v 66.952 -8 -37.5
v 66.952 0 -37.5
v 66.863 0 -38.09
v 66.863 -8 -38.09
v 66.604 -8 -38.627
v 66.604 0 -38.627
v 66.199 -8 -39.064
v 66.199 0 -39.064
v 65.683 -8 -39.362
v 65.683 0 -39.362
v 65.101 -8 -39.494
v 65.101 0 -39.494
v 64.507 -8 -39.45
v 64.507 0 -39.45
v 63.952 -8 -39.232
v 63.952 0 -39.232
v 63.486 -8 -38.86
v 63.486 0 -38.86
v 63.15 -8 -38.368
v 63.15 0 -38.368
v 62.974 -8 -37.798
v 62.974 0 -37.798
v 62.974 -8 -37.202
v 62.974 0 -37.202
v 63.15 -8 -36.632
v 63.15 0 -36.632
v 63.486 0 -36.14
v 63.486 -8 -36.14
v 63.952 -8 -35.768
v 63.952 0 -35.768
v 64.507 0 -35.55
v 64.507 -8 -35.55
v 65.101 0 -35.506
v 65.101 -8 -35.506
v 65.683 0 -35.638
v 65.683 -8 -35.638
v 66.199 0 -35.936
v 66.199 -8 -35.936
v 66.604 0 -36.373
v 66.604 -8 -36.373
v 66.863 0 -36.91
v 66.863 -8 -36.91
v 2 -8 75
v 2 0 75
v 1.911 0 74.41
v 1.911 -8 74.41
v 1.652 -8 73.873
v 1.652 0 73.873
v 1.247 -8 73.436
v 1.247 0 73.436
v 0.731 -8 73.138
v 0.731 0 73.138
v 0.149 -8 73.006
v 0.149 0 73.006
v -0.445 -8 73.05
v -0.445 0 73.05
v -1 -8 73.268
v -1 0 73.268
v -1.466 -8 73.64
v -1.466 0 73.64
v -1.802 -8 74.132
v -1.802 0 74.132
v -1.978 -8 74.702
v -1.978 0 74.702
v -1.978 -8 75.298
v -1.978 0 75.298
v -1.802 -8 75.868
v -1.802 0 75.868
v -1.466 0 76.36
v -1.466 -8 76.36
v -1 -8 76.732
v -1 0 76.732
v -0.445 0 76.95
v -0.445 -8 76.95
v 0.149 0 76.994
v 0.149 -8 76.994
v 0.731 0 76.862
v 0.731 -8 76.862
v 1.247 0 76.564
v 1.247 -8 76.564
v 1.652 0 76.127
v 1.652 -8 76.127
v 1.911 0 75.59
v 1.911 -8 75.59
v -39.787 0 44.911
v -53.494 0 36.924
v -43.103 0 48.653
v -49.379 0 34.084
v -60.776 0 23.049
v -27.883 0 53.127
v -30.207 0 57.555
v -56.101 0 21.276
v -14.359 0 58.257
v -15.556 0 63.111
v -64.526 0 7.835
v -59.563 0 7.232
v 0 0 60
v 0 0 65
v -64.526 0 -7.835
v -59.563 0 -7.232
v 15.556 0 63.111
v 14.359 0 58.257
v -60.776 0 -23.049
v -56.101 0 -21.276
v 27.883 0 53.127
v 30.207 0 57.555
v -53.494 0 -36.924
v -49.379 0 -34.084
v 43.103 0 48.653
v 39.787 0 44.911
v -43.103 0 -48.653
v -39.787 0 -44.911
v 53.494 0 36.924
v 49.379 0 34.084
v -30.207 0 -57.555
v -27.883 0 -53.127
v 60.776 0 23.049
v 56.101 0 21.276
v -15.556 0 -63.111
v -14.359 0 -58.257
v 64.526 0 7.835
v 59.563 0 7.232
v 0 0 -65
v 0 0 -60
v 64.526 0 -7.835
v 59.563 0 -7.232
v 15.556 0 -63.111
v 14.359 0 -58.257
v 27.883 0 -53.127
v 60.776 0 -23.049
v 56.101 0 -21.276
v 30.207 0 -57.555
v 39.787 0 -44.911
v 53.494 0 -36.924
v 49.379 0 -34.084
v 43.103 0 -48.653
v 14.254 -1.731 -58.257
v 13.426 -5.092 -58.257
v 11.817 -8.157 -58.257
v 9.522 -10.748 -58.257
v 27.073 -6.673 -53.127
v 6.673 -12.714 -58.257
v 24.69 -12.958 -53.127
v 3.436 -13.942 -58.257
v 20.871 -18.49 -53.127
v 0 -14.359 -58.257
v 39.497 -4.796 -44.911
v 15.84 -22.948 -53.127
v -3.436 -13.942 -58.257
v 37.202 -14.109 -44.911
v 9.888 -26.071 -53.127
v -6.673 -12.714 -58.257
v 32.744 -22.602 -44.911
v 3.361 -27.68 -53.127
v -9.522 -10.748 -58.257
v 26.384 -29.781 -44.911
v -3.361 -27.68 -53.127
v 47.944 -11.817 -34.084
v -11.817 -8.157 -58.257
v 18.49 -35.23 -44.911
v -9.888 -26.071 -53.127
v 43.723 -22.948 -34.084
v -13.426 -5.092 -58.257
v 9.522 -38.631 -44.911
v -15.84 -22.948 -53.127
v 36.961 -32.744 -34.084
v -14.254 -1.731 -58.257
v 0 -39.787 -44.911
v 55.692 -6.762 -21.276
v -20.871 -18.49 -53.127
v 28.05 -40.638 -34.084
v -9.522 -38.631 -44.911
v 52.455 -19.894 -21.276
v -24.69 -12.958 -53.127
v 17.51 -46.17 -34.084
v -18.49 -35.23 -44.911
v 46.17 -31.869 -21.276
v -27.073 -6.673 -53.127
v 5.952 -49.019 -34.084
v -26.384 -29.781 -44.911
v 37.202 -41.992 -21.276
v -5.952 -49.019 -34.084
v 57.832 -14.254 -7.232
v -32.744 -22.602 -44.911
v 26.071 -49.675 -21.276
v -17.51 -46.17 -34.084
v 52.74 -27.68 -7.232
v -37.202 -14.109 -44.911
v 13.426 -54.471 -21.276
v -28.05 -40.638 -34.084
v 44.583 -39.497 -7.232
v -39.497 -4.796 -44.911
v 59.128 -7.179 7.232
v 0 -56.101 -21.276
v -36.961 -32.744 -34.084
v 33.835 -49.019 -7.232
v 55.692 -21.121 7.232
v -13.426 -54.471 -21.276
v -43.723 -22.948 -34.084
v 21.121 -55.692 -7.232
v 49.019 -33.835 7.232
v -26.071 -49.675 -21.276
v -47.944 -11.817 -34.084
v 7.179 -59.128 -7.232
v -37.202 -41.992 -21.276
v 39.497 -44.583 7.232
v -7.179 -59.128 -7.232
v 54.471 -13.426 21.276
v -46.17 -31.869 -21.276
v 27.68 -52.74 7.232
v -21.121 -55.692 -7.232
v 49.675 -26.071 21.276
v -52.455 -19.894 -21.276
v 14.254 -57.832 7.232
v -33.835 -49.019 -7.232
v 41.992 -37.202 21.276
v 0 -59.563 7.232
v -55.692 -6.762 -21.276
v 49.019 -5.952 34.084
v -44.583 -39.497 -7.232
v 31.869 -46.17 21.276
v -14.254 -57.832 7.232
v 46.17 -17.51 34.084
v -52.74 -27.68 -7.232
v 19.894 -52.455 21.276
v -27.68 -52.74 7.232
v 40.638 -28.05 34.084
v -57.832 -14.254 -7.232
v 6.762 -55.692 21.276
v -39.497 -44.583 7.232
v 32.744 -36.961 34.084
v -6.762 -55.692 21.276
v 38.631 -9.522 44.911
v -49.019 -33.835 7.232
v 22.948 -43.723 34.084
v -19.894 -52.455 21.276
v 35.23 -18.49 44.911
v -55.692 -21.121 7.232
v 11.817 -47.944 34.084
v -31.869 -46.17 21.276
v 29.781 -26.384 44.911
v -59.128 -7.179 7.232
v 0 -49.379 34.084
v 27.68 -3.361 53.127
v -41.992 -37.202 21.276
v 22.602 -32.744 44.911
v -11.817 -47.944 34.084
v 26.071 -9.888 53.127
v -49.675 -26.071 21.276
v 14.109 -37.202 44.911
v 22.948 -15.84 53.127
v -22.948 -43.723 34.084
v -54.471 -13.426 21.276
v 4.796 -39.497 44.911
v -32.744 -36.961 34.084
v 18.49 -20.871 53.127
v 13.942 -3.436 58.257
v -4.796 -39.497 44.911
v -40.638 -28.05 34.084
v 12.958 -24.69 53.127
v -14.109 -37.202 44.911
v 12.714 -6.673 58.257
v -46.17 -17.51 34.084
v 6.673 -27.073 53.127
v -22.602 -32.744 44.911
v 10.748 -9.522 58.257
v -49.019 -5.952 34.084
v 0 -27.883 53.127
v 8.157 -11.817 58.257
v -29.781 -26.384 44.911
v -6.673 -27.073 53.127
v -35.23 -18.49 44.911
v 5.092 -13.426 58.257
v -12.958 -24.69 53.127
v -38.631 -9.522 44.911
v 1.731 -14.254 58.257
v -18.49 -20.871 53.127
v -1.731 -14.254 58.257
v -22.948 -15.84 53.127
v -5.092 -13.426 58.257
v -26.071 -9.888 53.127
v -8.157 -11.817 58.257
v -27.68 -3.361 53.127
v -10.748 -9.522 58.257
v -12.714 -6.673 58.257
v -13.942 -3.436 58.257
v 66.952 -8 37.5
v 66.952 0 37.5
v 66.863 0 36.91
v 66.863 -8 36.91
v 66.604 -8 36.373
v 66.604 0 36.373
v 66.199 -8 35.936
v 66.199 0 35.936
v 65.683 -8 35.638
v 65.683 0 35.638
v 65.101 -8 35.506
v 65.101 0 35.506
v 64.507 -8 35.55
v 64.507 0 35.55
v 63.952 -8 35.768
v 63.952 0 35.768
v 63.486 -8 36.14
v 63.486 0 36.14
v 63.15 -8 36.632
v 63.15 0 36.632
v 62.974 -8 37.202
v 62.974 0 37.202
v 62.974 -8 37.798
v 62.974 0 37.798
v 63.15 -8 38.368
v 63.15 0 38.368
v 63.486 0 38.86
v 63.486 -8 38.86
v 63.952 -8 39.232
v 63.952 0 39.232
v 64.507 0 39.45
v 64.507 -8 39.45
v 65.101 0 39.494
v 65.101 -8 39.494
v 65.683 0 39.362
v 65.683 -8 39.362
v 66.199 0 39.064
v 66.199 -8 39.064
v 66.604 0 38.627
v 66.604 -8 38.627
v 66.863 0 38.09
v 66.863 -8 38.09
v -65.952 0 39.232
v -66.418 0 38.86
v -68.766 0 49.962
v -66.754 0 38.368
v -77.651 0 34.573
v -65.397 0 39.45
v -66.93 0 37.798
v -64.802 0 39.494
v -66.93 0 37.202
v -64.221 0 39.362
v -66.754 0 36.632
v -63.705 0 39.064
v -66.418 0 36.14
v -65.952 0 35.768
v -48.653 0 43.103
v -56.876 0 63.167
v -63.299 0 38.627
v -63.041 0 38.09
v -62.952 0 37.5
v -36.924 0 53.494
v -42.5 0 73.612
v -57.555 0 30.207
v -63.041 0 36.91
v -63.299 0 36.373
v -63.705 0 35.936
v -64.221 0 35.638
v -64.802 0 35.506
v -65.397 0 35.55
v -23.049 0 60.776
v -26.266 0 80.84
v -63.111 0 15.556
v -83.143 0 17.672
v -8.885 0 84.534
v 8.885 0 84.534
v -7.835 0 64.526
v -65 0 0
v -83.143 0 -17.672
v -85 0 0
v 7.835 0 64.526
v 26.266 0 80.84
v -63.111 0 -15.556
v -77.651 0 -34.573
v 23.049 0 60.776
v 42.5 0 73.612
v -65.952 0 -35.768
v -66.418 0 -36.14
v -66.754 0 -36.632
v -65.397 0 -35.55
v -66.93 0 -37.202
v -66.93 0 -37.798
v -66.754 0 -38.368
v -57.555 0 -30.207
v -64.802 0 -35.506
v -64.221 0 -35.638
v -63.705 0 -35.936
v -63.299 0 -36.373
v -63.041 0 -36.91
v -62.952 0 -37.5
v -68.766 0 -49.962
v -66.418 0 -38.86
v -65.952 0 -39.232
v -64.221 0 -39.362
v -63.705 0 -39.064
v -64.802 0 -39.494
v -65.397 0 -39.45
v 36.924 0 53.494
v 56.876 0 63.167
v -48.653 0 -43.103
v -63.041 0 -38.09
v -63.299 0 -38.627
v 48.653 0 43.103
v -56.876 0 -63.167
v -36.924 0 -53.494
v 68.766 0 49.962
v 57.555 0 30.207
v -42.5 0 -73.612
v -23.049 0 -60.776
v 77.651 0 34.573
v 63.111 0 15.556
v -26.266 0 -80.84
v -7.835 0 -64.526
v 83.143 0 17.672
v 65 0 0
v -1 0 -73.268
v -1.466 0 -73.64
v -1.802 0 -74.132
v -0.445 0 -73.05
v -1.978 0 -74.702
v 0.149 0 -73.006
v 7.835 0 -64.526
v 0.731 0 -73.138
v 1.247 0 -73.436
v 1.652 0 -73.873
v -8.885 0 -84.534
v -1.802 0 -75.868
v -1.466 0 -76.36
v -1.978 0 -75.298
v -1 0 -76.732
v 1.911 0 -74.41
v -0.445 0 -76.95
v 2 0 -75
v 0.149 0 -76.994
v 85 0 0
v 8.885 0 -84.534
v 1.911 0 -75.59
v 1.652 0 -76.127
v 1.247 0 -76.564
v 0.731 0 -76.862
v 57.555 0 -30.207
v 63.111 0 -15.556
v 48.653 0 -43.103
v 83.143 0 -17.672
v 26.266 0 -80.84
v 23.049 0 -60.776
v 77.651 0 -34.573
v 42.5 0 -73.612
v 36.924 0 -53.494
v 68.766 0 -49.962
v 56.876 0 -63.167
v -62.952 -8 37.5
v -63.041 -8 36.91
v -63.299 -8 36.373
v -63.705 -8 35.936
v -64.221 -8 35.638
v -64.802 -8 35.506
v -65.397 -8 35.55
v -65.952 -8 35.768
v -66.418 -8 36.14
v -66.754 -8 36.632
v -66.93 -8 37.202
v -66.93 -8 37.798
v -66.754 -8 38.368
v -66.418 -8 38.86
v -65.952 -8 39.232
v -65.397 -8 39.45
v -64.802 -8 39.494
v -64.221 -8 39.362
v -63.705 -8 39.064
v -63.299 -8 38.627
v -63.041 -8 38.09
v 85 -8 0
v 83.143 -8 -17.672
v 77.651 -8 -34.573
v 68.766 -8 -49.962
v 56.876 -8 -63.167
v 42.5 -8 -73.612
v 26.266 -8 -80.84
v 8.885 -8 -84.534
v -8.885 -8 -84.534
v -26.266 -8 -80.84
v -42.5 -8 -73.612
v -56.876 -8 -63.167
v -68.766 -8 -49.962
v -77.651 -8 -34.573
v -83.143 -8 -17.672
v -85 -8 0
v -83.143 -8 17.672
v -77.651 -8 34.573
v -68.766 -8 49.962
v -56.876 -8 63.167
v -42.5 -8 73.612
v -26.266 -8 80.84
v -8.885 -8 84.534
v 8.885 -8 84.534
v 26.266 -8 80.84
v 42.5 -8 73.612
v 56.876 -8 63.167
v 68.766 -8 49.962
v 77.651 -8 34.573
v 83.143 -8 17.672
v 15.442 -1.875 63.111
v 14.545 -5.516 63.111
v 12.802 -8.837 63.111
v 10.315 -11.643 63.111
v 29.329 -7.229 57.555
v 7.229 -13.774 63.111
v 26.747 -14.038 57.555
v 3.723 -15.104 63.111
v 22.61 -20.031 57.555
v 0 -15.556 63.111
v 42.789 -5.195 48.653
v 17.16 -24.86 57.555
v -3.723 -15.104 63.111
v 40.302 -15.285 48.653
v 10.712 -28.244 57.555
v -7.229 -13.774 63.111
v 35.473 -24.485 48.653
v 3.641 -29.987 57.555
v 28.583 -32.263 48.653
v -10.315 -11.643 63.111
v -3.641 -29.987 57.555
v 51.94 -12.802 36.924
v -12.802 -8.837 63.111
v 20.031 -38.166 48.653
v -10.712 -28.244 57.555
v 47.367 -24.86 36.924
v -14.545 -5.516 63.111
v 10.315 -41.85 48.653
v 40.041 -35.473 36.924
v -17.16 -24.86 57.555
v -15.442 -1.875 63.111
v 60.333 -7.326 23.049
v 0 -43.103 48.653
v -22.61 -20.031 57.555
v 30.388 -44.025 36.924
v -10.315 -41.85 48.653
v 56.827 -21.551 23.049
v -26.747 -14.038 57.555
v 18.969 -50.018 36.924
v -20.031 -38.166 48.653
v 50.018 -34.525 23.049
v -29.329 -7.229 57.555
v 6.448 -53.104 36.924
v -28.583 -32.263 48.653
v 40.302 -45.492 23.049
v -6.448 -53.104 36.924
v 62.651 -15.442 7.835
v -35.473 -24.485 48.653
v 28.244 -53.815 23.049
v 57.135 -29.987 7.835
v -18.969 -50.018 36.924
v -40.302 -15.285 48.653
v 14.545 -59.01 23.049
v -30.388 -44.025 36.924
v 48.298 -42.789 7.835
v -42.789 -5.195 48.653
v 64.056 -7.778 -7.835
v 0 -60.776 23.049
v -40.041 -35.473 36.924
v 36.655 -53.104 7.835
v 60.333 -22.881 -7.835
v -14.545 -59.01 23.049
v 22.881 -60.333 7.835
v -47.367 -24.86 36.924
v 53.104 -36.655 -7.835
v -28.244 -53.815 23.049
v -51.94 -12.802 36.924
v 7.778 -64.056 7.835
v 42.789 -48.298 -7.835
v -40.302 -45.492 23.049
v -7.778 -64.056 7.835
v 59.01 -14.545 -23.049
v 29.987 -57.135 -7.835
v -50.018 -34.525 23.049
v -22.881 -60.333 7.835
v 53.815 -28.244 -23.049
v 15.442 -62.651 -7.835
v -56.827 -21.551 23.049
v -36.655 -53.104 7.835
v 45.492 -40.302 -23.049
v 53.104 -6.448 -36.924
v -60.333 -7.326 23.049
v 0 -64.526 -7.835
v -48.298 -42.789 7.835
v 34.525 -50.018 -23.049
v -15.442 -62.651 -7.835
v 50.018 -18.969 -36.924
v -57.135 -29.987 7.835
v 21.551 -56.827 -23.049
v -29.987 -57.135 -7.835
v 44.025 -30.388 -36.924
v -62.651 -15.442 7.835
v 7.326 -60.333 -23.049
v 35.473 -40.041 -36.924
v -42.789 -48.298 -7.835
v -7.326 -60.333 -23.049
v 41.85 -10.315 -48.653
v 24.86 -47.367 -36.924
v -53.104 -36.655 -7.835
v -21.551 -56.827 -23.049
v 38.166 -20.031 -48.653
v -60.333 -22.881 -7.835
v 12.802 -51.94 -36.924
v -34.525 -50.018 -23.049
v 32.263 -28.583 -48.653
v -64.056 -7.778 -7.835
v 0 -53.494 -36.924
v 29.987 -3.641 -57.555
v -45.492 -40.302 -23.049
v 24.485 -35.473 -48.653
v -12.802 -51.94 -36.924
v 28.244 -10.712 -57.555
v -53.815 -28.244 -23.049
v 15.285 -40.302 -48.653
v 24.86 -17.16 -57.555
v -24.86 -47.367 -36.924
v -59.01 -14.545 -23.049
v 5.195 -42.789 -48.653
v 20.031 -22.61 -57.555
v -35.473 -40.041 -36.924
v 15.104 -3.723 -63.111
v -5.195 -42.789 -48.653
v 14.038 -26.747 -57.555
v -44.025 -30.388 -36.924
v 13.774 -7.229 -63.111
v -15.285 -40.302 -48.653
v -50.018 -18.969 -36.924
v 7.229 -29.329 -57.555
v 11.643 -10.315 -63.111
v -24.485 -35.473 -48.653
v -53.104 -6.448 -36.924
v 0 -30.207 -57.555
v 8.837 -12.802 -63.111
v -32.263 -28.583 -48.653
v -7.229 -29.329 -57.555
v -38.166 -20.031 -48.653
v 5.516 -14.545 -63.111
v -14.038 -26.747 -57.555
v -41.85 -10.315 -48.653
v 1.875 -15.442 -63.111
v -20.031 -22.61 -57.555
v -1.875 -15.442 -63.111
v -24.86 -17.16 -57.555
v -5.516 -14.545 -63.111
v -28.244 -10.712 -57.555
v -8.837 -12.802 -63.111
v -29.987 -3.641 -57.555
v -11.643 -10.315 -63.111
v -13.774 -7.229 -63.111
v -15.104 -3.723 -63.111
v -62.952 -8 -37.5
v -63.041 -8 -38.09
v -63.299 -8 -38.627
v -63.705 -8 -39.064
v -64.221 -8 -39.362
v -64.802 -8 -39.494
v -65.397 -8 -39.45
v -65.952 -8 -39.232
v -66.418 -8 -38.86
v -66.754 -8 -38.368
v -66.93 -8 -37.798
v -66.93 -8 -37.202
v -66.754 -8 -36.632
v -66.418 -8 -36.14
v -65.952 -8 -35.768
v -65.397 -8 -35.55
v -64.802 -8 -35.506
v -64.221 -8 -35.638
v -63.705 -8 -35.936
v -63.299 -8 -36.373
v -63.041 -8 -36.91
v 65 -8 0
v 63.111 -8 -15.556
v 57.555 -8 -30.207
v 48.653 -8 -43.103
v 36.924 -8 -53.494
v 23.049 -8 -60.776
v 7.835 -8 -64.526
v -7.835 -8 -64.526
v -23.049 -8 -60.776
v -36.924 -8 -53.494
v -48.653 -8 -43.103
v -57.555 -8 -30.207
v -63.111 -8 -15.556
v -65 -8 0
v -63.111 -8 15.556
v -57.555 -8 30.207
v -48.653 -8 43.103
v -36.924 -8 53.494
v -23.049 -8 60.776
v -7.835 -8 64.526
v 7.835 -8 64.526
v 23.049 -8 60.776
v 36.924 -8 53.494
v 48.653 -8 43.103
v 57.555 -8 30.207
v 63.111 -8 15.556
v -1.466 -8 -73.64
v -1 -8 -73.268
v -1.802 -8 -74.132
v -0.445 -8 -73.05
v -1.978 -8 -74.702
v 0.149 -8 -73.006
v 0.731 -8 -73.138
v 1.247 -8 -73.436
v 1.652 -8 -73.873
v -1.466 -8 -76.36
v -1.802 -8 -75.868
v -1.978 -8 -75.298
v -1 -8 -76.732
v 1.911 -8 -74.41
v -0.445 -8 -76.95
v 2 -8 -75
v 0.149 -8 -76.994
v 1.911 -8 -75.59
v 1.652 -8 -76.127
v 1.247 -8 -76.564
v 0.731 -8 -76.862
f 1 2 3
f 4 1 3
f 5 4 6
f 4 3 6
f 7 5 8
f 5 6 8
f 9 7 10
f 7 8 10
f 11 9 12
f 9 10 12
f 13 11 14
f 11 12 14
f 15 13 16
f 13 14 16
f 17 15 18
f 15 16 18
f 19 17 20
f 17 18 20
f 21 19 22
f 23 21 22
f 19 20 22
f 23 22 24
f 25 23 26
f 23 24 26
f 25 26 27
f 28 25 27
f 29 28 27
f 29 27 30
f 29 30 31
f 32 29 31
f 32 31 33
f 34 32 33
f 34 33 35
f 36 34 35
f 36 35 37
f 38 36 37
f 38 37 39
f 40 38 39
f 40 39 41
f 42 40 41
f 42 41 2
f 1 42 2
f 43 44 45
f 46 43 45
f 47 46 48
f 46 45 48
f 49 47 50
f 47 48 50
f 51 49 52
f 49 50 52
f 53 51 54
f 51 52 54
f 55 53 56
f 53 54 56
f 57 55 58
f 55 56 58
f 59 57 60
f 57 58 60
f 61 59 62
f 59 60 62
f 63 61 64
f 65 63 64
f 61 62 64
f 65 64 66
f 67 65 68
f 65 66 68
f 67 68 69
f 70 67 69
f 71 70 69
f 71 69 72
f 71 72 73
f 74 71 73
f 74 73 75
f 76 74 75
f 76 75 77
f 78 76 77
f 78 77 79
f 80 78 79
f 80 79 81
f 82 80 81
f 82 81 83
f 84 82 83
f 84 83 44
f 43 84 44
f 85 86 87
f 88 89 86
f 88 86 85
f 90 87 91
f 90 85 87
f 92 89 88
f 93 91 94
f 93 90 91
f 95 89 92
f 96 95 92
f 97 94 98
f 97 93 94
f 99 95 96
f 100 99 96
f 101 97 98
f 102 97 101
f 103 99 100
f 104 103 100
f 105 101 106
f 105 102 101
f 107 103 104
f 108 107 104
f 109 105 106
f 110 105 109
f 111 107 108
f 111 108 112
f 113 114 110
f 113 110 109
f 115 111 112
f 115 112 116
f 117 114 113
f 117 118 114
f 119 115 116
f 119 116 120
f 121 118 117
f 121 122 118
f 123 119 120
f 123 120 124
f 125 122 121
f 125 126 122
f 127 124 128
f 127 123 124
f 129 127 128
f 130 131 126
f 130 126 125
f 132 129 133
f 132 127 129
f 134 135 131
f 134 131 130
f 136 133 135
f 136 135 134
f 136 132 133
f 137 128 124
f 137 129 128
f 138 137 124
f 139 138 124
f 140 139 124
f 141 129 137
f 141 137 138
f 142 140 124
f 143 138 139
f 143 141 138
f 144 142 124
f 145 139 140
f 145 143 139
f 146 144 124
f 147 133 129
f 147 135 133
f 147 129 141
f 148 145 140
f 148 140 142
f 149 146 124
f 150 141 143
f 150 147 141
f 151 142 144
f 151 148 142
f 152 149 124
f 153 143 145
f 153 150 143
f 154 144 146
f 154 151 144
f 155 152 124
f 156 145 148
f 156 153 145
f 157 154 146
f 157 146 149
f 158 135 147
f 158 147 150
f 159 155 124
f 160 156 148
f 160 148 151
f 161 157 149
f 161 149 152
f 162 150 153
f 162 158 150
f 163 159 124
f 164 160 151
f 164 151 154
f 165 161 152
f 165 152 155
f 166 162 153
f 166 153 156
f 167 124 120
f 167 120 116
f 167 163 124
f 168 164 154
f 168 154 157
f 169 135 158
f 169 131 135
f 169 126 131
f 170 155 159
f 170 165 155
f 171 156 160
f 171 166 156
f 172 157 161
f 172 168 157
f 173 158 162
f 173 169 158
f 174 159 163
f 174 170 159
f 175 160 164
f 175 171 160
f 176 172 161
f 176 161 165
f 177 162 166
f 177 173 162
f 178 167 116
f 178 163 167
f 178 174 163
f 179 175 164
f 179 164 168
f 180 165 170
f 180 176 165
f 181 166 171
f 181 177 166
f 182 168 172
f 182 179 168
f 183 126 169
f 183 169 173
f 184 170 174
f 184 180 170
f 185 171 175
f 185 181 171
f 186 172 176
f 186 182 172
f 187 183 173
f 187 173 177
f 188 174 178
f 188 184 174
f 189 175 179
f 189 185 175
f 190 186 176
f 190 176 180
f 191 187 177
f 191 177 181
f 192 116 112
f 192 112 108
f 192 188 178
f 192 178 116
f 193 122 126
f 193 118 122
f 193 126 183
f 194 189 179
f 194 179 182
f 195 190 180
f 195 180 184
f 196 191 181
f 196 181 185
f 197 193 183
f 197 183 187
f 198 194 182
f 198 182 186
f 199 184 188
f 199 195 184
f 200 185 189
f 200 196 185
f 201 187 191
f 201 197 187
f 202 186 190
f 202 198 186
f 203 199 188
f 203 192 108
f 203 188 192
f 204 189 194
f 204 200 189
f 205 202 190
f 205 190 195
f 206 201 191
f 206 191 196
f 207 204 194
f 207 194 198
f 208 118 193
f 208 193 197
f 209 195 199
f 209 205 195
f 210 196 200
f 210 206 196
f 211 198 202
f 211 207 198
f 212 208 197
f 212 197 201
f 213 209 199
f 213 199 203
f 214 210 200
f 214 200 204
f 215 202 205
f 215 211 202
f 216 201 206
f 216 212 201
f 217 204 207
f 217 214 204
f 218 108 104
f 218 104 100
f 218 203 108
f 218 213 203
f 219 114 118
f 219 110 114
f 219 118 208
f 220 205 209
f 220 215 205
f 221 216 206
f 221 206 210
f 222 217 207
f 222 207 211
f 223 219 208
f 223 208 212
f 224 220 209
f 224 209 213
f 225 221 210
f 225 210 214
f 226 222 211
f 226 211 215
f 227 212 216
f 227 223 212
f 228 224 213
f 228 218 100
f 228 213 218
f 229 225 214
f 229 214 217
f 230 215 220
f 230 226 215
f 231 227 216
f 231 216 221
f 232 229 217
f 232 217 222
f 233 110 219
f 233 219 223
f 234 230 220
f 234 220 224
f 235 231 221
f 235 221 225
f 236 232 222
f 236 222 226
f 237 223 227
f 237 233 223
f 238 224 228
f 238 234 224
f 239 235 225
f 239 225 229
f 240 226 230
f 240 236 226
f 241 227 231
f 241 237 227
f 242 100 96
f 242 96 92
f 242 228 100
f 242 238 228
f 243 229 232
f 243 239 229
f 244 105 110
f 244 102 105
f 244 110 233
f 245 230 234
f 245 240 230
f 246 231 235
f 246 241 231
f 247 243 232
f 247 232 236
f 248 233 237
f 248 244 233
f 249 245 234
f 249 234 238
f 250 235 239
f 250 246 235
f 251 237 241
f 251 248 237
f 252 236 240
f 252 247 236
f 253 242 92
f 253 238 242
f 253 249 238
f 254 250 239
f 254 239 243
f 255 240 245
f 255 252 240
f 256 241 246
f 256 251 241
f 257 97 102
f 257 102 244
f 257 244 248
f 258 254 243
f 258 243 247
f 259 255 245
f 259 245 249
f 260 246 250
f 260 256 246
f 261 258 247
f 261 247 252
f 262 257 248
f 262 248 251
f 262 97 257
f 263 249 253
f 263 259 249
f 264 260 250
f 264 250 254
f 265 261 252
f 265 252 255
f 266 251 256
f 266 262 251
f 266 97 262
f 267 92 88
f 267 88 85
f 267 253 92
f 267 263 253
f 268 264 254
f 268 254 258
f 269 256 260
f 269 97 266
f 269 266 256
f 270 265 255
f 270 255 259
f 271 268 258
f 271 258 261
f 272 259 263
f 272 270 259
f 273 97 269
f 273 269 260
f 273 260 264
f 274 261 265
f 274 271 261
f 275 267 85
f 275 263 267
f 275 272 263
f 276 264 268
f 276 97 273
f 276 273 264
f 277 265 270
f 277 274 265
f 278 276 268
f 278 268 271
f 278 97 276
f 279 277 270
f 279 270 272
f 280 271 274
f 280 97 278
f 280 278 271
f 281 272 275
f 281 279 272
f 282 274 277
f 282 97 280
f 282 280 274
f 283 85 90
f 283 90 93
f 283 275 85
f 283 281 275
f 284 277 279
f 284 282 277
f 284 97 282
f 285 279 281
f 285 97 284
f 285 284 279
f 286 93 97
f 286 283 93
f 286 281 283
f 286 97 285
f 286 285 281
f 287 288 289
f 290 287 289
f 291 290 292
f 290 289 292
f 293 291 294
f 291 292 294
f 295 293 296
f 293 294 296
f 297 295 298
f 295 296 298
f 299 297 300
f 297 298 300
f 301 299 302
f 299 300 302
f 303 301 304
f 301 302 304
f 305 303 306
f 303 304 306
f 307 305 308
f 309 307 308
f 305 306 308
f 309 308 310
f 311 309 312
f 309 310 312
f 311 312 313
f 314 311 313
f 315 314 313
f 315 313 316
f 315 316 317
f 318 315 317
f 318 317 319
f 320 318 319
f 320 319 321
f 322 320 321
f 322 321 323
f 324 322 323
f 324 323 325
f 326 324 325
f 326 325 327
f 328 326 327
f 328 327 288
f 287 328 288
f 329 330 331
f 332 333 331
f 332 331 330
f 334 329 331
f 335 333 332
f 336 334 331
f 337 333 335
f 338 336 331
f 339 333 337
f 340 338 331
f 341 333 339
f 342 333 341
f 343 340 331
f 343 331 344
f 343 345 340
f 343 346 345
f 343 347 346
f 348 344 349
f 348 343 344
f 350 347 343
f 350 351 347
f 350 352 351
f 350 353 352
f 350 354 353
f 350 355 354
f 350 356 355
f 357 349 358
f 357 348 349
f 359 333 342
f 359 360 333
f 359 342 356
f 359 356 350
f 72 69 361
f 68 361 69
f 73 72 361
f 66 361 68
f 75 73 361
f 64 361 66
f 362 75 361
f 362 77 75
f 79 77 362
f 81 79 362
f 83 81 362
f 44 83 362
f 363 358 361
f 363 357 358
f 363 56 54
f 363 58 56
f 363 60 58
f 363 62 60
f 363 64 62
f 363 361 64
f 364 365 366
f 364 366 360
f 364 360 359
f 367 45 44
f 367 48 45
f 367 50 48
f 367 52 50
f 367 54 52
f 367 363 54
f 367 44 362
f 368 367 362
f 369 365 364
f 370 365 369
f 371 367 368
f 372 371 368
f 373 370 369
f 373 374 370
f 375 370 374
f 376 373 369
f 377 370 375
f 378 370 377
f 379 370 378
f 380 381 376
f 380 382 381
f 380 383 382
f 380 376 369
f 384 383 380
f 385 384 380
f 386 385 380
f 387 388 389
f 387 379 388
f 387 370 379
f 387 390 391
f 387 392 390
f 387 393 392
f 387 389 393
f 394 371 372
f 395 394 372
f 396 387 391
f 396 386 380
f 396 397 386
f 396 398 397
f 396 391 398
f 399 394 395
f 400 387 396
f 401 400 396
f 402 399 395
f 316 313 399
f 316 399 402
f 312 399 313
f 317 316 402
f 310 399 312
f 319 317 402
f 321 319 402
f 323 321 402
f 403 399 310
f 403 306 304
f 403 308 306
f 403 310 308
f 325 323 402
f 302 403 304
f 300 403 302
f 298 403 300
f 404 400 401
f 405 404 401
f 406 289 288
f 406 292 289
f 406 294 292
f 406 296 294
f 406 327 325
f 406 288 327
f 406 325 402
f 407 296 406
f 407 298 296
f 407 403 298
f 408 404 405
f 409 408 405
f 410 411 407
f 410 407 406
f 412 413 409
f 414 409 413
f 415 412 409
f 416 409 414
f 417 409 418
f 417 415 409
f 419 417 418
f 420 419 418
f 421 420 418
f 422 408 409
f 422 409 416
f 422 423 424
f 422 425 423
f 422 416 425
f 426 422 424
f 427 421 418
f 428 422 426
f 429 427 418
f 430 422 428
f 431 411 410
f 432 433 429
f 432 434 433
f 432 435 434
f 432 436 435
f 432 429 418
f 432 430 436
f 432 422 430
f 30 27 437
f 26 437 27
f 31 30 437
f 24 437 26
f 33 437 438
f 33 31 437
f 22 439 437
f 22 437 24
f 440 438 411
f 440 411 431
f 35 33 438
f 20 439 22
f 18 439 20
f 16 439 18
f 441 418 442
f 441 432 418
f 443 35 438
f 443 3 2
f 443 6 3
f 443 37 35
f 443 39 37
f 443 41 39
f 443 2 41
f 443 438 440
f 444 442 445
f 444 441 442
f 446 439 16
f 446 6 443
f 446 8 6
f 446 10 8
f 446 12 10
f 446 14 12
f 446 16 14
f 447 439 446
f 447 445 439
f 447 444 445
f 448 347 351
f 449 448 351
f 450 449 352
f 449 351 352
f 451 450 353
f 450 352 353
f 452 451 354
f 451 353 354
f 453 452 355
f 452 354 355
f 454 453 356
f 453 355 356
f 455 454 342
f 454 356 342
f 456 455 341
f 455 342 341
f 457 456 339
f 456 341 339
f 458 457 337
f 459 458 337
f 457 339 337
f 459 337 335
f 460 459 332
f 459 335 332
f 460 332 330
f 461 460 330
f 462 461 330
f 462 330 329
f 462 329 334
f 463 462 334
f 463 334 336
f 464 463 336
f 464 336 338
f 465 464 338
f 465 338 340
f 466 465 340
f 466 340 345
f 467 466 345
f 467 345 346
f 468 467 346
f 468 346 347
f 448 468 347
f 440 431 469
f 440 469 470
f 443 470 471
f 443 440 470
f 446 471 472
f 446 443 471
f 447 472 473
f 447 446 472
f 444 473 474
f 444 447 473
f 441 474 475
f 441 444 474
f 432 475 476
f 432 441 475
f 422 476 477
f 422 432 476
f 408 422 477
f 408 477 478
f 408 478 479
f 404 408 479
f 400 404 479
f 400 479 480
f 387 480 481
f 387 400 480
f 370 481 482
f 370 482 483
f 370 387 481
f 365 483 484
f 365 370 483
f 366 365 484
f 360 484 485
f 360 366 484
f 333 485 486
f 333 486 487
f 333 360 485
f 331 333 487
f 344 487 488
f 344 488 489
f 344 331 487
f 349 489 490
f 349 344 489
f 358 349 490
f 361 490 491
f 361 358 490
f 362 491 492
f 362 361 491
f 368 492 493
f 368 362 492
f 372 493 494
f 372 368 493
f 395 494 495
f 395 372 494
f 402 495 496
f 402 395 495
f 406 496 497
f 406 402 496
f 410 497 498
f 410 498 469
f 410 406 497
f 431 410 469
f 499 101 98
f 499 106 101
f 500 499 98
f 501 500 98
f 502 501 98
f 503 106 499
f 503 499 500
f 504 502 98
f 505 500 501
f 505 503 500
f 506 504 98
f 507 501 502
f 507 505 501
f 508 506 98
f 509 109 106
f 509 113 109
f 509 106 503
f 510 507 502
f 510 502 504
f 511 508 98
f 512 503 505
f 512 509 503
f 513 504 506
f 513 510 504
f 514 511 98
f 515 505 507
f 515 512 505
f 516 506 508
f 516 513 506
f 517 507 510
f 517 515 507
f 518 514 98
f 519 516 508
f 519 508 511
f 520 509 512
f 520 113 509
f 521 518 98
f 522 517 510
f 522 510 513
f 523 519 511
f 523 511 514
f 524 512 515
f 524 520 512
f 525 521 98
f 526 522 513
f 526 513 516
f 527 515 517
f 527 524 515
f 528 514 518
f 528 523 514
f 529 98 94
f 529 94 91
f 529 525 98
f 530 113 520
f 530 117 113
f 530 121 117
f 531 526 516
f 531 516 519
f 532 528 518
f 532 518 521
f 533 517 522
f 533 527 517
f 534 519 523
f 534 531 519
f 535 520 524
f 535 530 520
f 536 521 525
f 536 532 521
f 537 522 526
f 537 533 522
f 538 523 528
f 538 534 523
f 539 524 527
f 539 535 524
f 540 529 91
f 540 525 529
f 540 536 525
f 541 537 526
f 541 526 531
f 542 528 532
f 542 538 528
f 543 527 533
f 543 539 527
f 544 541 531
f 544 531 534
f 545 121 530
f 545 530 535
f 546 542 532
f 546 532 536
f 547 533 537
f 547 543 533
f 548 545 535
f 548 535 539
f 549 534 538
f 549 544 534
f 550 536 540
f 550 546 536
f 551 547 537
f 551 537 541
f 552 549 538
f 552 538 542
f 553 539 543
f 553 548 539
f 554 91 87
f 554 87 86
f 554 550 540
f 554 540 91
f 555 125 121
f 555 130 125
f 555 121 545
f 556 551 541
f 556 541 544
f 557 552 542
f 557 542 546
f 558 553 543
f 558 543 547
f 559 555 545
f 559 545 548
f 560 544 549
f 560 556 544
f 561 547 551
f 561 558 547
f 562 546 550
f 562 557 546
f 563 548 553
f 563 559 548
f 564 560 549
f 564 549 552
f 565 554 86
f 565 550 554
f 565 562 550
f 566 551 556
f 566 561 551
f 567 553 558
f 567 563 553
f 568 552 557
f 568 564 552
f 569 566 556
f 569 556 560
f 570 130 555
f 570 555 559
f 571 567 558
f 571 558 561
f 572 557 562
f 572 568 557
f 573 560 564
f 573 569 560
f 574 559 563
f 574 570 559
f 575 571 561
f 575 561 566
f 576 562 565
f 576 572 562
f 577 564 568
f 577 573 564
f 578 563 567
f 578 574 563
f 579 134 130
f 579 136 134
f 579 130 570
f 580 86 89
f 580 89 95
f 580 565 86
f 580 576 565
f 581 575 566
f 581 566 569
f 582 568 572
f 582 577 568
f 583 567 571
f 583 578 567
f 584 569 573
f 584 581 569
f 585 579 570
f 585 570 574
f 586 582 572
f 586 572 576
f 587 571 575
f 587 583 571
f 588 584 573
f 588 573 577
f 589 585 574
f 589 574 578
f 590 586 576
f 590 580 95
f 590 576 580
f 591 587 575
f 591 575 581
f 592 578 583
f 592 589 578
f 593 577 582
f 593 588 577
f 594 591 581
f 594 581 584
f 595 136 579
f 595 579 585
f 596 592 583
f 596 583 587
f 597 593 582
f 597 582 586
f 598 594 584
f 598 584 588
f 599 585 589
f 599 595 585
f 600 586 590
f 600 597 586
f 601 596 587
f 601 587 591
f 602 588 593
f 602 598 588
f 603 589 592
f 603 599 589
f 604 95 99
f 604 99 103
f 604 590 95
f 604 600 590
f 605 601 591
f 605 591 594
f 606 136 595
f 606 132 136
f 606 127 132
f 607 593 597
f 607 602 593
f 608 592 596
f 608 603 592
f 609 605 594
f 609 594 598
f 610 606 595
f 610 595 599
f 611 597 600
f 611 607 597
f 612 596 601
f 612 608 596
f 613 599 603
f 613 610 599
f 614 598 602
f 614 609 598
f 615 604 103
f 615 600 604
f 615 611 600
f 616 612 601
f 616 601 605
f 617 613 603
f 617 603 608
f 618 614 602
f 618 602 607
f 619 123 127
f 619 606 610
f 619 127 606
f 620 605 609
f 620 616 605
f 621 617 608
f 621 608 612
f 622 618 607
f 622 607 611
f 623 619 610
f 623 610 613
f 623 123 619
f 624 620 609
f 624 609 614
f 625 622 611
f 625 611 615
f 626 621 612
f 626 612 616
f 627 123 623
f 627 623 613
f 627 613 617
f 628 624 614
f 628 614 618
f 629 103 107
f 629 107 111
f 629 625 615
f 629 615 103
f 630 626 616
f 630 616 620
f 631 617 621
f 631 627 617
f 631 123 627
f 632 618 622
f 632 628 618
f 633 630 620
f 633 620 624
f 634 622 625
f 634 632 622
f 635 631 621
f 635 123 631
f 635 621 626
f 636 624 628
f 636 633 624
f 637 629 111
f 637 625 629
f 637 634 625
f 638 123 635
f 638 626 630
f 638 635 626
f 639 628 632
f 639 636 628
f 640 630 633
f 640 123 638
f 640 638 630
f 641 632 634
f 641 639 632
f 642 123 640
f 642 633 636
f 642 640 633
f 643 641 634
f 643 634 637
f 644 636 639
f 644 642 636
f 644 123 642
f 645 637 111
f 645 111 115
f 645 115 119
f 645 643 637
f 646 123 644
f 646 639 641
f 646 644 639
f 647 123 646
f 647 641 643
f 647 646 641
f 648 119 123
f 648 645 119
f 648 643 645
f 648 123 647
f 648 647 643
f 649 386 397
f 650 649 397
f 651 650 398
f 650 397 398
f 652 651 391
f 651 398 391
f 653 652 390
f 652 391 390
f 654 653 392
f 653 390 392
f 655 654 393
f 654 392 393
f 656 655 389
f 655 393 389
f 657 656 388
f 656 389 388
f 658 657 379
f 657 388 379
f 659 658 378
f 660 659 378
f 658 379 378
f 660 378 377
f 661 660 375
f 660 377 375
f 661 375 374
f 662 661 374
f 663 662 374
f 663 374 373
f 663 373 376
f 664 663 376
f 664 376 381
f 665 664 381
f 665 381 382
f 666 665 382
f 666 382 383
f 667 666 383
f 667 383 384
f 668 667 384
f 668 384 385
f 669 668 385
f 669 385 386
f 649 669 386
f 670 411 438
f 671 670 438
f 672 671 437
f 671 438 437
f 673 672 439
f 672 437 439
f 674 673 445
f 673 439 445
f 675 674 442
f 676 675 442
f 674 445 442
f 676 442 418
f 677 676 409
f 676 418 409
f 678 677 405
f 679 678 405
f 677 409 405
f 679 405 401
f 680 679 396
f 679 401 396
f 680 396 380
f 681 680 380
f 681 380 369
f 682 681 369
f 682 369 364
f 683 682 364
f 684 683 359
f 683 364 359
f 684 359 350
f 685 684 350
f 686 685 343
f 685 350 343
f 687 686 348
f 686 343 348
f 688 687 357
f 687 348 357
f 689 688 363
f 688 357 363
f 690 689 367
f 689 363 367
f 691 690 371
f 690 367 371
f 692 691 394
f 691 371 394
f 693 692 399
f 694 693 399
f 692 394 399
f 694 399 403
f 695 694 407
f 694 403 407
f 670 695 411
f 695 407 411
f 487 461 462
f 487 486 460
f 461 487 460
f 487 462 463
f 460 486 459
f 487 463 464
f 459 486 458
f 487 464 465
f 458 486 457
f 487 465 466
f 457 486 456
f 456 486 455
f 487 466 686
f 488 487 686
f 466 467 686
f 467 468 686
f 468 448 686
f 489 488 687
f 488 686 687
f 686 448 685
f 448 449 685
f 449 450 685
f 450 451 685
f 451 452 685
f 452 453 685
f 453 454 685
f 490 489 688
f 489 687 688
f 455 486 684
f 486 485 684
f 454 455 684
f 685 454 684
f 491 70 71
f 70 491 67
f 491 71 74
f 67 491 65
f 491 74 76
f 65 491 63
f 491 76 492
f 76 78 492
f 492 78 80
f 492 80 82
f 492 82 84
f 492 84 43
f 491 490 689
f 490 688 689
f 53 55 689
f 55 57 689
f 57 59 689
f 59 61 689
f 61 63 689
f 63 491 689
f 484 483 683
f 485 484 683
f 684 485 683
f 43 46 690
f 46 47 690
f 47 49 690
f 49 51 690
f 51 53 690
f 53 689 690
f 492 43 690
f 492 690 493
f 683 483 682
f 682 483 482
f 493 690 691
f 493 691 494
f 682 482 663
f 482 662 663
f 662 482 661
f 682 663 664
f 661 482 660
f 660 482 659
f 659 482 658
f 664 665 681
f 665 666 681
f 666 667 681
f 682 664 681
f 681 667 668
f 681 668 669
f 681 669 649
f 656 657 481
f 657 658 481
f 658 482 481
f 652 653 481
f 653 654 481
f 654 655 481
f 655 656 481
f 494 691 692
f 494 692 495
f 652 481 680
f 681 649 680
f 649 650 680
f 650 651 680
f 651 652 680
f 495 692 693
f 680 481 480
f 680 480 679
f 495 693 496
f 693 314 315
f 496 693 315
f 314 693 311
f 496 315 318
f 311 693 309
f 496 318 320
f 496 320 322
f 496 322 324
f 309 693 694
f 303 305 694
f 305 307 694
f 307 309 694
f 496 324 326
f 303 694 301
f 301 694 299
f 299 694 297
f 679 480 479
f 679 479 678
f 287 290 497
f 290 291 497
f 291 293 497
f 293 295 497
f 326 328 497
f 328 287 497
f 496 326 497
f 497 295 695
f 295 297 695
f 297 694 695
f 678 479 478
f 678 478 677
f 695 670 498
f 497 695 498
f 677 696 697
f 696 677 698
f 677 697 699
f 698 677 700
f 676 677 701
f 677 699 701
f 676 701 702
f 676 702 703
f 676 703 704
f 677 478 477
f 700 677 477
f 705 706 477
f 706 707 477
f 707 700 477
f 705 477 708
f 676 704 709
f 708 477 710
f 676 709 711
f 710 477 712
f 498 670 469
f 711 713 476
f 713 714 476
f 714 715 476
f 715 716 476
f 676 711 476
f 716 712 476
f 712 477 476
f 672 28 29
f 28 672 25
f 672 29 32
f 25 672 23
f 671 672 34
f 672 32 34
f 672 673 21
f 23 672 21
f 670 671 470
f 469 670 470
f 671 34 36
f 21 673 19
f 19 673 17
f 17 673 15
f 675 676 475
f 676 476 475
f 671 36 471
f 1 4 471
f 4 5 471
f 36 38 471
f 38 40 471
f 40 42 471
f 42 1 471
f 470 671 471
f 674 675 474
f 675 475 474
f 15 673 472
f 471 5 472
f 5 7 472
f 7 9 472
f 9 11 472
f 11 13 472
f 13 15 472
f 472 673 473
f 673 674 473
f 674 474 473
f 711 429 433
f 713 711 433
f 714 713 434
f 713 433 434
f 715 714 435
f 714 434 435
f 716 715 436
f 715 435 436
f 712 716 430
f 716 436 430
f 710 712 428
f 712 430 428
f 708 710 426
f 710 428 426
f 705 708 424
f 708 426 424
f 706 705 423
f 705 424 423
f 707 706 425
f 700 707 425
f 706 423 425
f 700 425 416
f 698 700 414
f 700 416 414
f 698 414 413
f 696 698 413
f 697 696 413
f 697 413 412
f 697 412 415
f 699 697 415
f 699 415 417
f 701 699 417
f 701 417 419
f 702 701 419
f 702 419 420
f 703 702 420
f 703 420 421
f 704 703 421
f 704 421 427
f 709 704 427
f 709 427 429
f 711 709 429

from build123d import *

# Parameters (mm, degrees)
REVOLVE_14_ANGLE    = 180
SKETCH_3_R          = 85
SKETCH_3_R_2        = 65
EXTRUDE_1_DEPTH     = 8
SKETCH_4_R          = 2
CUT_EXTRUDE_2_DEPTH = 66


with BuildPart() as part:
    # 草图1 → 旋转-薄壁14 (revolve)
    with BuildSketch(Plane(origin=(0, 0, 0), x_dir=(1, 0, 0), z_dir=(0, 1, 0))):
        with BuildLine():
            ThreePointArc((0, -65), (65, 0), (0, 65))
            Line((0, 65), (0, 60))
            ThreePointArc((0, 60), (60, 0), (0, -60))
            Line((0, -60), (0, -65))
        make_face()
    revolve(axis=Axis((0, 0, 65), (0, 0, -1)), revolution_arc=REVOLVE_14_ANGLE)


with BuildPart() as body_2:
    # 草图3 → 凸台-拉伸1 (new body)
    with BuildSketch(Plane(origin=(0, 0, 0), x_dir=(1, 0, 0), z_dir=(0, 1, 0))):
        Circle(SKETCH_3_R)
        Circle(SKETCH_3_R_2, mode=Mode.SUBTRACT)
    extrude(amount=-EXTRUDE_1_DEPTH)

    # 草图4 → 切除-拉伸2 (cut, through all)
    with BuildSketch(Plane(origin=(0, 0, 0), x_dir=(1, 0, 0), z_dir=(0, 1, 0))):
        with Locations((0, 75)):
            Circle(SKETCH_4_R)
        with Locations((64.951905284, 37.5)):
            Circle(SKETCH_4_R)
        with Locations((64.951905284, -37.5)):
            Circle(SKETCH_4_R)
        with Locations((0, -75)):
            Circle(SKETCH_4_R)
        with Locations((-64.951905284, -37.5)):
            Circle(SKETCH_4_R)
        with Locations((-64.951905284, 37.5)):
            Circle(SKETCH_4_R)
    extrude(amount=-CUT_EXTRUDE_2_DEPTH, mode=Mode.SUBTRACT)


solid = Compound([part.part, body_2.part])
